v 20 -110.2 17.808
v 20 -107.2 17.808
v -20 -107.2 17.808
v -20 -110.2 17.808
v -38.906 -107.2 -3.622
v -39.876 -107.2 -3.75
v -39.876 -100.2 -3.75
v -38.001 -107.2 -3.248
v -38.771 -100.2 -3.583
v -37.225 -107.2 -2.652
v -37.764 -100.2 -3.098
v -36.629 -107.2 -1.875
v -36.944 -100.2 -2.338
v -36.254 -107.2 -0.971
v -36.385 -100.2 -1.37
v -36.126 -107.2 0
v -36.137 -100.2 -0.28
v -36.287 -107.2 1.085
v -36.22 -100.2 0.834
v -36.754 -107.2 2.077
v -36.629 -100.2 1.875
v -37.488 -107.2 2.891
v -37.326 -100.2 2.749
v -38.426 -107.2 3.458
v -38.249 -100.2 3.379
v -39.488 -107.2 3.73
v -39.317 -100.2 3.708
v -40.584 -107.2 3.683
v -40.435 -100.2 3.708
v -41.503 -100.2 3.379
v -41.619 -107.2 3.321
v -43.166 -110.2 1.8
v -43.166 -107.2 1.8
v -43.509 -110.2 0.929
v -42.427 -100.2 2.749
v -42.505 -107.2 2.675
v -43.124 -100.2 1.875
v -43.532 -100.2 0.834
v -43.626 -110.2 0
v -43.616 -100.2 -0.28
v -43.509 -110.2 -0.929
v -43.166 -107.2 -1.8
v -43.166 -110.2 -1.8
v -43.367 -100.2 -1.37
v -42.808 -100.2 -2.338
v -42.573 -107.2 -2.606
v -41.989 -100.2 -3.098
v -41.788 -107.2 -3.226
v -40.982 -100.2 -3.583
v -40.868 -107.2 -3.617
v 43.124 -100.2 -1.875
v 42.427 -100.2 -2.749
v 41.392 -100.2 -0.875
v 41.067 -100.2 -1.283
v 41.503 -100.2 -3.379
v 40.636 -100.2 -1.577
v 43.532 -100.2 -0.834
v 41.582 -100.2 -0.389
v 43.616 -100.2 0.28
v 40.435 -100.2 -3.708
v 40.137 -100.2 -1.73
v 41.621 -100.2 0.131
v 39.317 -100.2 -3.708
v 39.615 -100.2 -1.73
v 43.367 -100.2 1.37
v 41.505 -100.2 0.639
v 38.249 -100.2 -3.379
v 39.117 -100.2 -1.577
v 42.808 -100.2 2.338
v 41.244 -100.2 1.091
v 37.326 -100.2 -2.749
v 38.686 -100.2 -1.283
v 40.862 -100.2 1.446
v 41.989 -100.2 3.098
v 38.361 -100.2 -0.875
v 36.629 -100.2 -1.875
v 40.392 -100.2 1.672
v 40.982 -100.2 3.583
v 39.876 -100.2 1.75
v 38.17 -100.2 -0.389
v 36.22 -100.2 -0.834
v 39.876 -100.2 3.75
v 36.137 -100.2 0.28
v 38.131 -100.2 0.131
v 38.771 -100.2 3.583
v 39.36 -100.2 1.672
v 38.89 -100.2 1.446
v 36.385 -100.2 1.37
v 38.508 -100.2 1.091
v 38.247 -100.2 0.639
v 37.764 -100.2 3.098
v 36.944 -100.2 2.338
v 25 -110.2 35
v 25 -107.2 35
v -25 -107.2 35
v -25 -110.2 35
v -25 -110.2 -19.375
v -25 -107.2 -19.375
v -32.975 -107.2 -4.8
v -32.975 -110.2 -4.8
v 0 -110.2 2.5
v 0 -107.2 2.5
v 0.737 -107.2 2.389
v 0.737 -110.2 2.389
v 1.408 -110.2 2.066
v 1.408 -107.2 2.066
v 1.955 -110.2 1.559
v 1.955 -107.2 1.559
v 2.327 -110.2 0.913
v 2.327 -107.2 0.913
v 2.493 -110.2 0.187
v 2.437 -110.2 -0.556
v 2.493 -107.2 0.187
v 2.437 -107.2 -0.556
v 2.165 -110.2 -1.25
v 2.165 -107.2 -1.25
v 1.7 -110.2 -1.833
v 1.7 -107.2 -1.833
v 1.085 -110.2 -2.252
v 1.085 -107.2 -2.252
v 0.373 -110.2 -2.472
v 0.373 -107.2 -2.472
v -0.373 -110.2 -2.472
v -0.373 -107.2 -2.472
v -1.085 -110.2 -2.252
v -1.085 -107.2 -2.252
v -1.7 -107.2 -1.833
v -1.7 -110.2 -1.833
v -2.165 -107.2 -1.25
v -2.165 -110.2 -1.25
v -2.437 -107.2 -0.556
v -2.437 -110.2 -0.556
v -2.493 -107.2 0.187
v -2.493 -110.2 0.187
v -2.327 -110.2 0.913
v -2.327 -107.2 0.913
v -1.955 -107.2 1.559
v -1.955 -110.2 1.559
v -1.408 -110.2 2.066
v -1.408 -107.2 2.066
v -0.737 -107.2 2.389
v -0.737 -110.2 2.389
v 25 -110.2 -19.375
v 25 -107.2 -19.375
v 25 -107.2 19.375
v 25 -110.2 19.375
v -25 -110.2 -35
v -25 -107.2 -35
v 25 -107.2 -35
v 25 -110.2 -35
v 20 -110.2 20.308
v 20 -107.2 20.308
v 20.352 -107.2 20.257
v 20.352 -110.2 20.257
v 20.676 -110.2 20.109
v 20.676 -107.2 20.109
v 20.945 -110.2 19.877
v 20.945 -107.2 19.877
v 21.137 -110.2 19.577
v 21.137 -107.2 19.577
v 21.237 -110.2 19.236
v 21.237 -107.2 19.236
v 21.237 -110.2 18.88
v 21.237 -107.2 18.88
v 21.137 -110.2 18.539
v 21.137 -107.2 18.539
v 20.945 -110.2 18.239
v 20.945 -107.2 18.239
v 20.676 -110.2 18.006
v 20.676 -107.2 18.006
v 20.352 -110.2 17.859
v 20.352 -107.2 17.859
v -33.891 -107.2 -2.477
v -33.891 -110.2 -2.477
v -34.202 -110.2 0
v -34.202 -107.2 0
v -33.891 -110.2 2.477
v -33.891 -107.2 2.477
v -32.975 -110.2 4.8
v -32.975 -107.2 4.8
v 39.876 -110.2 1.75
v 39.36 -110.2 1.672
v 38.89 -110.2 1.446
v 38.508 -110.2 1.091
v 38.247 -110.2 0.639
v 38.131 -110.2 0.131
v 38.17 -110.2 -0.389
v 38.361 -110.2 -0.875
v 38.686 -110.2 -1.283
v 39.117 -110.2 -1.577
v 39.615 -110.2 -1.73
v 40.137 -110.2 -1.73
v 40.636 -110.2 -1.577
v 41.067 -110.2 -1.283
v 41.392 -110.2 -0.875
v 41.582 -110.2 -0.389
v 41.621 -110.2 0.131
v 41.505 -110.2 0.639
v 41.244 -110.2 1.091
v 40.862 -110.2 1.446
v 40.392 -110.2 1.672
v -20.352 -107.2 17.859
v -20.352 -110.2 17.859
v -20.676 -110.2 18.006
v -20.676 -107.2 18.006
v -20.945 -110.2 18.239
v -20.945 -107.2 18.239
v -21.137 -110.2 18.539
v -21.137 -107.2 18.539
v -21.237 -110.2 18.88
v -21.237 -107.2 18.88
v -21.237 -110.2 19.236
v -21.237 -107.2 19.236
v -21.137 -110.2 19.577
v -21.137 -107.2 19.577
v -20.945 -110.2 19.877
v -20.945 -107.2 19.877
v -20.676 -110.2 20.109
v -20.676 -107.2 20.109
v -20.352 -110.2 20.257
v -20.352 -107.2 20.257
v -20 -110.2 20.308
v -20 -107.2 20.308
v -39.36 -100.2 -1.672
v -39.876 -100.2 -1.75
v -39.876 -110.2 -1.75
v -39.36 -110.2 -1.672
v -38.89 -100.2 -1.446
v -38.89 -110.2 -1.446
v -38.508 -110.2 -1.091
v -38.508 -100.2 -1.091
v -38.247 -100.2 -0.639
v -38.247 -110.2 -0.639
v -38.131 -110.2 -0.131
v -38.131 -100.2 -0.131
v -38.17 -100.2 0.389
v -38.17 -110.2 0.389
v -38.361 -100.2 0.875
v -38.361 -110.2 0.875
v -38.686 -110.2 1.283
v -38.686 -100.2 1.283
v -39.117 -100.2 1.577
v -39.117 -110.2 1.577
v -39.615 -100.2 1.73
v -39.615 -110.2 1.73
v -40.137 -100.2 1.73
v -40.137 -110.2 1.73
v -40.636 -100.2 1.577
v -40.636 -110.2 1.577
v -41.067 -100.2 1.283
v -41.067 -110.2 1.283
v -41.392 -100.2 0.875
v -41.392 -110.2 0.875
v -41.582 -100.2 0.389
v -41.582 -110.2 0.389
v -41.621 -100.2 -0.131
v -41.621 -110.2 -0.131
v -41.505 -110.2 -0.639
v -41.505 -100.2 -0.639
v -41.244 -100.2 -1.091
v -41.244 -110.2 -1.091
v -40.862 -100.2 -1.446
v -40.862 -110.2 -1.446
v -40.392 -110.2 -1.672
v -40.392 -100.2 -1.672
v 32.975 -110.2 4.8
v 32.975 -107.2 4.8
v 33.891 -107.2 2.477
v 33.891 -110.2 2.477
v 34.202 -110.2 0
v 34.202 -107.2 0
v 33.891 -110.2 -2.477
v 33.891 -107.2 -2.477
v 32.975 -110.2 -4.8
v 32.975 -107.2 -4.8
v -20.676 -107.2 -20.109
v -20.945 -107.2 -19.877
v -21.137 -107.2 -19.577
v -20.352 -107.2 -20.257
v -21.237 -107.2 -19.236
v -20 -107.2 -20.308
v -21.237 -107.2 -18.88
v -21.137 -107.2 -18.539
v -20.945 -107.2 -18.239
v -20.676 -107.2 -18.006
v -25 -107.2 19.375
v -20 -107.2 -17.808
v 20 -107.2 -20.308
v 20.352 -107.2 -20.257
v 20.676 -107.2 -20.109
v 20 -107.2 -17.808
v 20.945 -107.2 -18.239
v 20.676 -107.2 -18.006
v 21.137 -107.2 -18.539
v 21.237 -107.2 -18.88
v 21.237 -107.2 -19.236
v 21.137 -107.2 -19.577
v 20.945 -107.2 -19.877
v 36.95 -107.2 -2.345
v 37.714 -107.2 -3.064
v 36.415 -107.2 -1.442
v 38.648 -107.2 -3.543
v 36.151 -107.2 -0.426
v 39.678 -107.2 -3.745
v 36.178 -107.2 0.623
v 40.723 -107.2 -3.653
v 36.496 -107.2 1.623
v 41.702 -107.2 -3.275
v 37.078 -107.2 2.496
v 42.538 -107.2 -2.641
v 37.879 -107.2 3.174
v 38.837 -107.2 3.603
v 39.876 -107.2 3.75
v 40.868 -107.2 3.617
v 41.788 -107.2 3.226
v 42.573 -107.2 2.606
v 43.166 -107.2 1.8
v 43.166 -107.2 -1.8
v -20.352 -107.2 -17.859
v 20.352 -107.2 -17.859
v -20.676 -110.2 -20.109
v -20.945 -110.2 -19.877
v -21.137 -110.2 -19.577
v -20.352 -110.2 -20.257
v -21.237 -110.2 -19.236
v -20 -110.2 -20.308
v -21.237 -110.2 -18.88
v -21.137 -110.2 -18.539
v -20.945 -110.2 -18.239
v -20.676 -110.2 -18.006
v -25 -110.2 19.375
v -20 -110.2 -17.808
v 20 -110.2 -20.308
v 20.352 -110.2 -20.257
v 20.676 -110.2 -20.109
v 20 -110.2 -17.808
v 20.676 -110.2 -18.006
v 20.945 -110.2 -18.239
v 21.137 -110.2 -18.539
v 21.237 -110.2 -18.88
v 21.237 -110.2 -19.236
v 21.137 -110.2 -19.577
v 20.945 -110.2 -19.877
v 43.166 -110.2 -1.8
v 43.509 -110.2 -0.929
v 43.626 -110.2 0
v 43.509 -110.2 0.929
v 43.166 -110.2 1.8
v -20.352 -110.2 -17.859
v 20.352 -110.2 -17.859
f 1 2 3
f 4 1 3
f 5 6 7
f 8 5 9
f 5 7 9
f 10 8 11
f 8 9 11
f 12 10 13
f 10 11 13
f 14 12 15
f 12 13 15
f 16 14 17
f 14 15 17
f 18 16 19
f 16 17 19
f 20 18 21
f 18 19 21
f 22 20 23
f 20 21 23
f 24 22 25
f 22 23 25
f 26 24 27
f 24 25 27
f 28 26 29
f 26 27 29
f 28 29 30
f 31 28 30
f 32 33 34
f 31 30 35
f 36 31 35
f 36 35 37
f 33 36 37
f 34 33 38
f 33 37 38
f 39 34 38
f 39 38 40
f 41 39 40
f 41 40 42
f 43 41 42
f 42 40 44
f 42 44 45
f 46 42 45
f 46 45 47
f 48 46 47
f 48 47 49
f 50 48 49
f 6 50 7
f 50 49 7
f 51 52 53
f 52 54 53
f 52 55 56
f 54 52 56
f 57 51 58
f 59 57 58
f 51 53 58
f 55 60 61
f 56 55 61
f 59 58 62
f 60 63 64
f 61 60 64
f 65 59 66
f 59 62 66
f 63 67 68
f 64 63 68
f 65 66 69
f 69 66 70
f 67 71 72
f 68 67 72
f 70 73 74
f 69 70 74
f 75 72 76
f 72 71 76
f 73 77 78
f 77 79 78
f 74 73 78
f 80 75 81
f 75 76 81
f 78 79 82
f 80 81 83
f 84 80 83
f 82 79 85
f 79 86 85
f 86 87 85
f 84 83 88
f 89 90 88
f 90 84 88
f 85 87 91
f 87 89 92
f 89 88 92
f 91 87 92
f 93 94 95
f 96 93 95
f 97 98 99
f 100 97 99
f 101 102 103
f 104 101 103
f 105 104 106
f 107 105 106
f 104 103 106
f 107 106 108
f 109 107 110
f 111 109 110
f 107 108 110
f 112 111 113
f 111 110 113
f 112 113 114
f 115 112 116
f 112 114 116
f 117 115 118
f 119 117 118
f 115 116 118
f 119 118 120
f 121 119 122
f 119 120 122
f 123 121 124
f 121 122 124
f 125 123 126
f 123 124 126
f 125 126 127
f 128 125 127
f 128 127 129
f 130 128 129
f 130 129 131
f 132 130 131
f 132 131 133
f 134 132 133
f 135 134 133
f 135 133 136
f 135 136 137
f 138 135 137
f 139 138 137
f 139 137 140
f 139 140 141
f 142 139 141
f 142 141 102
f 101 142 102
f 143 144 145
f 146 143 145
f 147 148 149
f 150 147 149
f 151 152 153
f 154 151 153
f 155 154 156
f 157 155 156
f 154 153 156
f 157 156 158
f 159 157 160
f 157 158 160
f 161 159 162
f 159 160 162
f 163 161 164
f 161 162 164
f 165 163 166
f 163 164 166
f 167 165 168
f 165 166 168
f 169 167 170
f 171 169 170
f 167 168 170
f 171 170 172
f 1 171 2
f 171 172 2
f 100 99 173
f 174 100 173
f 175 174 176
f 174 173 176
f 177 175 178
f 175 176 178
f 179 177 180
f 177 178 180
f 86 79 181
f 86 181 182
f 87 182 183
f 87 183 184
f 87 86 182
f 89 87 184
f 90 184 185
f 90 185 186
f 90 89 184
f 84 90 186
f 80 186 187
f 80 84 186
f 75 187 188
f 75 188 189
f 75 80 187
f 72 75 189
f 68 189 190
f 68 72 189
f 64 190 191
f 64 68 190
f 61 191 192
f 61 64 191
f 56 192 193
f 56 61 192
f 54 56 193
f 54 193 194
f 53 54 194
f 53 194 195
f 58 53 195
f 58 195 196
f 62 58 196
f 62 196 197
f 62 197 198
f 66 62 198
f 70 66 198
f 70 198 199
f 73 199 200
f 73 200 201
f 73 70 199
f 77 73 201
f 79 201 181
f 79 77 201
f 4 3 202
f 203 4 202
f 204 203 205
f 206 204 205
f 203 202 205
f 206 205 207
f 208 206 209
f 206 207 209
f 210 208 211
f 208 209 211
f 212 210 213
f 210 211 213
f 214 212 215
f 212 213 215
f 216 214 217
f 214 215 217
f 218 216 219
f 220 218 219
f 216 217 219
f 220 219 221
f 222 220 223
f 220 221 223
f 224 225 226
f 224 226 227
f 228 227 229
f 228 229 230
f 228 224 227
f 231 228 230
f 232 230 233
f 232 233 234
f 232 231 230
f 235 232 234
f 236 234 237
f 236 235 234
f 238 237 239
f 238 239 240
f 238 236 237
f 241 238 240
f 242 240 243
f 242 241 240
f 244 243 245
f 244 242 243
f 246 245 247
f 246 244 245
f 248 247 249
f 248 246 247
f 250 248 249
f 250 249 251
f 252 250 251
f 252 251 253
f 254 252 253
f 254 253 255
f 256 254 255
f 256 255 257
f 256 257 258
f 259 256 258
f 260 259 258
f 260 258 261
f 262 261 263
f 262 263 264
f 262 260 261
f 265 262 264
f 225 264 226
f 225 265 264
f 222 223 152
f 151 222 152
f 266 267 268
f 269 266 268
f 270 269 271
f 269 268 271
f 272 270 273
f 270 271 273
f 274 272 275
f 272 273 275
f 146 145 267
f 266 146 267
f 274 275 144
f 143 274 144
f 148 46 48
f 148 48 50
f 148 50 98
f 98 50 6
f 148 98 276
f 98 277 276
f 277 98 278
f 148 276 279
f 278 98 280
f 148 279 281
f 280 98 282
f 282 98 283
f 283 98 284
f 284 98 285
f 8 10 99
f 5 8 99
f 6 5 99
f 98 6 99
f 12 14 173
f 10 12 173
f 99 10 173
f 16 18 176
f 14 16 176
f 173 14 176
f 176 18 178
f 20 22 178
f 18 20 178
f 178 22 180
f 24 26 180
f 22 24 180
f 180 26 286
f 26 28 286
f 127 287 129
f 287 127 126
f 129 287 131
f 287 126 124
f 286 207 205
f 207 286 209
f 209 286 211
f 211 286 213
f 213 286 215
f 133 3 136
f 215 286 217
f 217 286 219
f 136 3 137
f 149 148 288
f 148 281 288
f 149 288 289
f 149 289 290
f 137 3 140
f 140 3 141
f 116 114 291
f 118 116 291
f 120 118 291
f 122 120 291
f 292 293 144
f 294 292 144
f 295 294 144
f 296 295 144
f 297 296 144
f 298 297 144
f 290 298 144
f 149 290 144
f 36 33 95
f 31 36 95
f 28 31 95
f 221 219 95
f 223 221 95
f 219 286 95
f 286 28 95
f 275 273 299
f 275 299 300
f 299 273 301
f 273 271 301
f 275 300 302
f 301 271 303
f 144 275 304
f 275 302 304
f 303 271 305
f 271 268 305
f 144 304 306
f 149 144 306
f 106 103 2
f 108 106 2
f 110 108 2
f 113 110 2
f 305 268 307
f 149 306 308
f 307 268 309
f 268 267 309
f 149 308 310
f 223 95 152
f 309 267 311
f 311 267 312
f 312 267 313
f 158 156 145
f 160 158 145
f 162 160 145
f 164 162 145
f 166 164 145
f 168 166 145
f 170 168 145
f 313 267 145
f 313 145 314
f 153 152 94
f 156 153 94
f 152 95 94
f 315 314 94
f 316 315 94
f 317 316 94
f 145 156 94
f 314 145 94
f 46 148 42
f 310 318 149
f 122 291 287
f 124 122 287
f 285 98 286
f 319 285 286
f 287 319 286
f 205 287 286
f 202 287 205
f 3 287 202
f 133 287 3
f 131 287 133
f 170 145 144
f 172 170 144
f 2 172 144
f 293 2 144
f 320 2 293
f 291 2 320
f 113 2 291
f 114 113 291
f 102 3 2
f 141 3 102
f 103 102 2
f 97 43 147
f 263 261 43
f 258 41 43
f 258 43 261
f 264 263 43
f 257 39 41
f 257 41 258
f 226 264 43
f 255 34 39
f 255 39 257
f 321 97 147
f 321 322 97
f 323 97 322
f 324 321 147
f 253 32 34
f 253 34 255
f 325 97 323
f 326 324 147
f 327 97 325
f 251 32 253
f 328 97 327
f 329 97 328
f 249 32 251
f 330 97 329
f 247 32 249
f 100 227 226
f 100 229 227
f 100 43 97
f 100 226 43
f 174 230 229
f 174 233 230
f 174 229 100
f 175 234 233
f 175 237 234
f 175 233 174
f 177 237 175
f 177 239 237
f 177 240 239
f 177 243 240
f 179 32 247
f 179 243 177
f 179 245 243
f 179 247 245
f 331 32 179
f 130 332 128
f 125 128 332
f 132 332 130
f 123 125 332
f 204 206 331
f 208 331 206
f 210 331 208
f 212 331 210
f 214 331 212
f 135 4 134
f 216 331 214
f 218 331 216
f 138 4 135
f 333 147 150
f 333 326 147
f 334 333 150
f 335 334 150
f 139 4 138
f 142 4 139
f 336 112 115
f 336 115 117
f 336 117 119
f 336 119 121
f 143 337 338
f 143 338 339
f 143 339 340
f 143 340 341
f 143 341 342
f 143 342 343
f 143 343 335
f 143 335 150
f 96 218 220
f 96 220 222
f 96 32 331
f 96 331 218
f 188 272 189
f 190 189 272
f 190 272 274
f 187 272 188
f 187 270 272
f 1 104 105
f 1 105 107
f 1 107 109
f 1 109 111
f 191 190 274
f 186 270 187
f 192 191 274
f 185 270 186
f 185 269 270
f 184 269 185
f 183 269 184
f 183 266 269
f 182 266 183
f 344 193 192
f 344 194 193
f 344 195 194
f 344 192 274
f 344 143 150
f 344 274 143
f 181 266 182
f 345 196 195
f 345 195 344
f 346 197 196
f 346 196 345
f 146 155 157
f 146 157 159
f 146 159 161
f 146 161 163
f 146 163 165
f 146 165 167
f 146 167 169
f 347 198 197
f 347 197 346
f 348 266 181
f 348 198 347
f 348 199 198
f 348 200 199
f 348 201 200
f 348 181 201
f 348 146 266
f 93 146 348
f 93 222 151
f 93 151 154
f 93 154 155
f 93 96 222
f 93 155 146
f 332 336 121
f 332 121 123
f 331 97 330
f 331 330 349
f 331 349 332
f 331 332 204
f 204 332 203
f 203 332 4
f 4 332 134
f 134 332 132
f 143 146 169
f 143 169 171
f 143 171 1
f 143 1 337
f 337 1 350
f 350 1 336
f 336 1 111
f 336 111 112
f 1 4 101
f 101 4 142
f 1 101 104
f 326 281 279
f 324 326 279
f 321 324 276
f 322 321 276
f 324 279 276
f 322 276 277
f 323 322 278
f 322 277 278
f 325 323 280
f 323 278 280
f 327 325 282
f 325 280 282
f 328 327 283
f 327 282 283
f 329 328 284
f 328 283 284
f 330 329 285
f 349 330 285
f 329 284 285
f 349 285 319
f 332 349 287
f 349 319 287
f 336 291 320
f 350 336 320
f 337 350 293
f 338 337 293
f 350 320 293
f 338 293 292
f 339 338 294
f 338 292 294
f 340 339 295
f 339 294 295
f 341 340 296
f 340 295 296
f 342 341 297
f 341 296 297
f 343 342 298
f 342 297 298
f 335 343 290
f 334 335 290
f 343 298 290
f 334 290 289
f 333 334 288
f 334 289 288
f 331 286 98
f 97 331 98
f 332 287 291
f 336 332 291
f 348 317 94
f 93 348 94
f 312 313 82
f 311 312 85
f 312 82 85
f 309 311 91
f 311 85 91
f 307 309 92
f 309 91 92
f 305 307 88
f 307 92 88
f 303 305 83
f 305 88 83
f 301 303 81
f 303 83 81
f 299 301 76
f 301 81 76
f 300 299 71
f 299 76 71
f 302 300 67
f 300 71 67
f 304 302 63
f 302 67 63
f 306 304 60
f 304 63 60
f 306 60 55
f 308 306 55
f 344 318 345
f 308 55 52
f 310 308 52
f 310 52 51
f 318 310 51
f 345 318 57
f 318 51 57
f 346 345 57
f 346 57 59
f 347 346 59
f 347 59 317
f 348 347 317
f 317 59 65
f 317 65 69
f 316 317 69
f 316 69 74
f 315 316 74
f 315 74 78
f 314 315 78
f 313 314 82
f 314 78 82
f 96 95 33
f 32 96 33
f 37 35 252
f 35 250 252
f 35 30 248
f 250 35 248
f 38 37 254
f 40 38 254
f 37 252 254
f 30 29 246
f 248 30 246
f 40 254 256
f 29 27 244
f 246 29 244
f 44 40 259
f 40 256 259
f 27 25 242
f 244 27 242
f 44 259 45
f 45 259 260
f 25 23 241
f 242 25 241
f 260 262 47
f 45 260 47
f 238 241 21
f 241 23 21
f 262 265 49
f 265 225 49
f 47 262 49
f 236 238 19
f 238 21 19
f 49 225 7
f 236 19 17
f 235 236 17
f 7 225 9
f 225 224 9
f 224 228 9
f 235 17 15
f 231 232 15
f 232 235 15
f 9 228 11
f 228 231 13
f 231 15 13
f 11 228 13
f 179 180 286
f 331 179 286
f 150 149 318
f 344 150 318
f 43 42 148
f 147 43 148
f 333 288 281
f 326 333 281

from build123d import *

# Parameters (mm, degrees)
SKETCH1_R             = 3.75
SKETCH1_R_2           = 1.75
BOSS_EXTRUDE1_DEPTH   = 10
BOSS_EXTRUDE1_2_DEPTH = 10
BOSS_EXTRUDE2_START   = -3
BOSS_EXTRUDE2_DEPTH   = 3
SKETCH3_R             = 2.5
CUT_EXTRUDE1_DEPTH    = 57.367102098
CUT_EXTRUDE2_DEPTH    = 57.367102098


with BuildPart() as part:
    # Sketch1 → Boss-Extrude1 (new body)
    with BuildSketch(Plane.XZ.offset(100.2)):
        with Locations(Location((-39.876255843, 0, 0), (0, 0, 270))):
            Circle(SKETCH1_R)
        with Locations(Location((-39.876255843, 0, 0), (0, 0, 270))):
            Circle(SKETCH1_R_2, mode=Mode.SUBTRACT)
    extrude(amount=BOSS_EXTRUDE1_DEPTH)



with BuildPart() as body_2:
    # Sketch1 → Boss-Extrude1 2 (new body)
    with BuildSketch(Plane.XZ.offset(100.2)):
        with Locations(Location((39.876255843, 0, 0), (0, 0, 90))):
            Circle(SKETCH1_R)
        with Locations(Location((39.876255843, 0, 0), (0, 0, 90))):
            Circle(SKETCH1_R_2, mode=Mode.SUBTRACT)
    extrude(amount=BOSS_EXTRUDE1_2_DEPTH)


with BuildPart() as part_1:
    add(part.part)

    add(body_2.part)  # Boss-Extrude2 merges body 2
    # Sketch2 → Boss-Extrude2 (add)
    with BuildSketch(Plane.XZ.offset(110.2).offset(BOSS_EXTRUDE2_START)):
        with BuildLine():
            Line((25, 35), (-25, 35))
            Line((-25, 35), (-43.165990296, 1.800040897))
            ThreePointArc((-43.165990296, 1.800040897), (-38.94727904, 3.633111903), (-36.126255843, 0))
            ThreePointArc((-36.126255843, 0), (-38.94727904, -3.633111903), (-43.165990296, -1.800040897))
            Line((-43.165990296, -1.800040897), (-25, -35))
            Line((-25, -35), (25, -35))
            Line((25, -35), (43.165990296, -1.800040897))
            ThreePointArc((43.165990296, -1.800040897), (36.126255843, 0), (43.165990296, 1.800040897))
            Line((43.165990296, 1.800040897), (25, 35))
        make_face()
        with BuildLine():
            Line((-25, 19.375354996), (-25, -19.375354996))
            Line((-25, -19.375354996), (-32.975123568, -4.800109057))
            ThreePointArc((-32.975123568, -4.800109057), (-34.20249836, 0), (-32.975123568, 4.800109057))
            Line((-32.975123568, 4.800109057), (-25, 19.375354996))
        make_face(mode=Mode.SUBTRACT)
        with BuildLine():
            Line((32.975123568, -4.800109057), (25, -19.375354996))
            Line((25, -19.375354996), (25, 19.375354996))
            Line((25, 19.375354996), (32.975123568, 4.800109057))
            ThreePointArc((32.975123568, 4.800109057), (34.20249836, 0), (32.975123568, -4.800109057))
        make_face(mode=Mode.SUBTRACT)
    extrude(amount=BOSS_EXTRUDE2_DEPTH)

    # Sketch3 → Cut-Extrude1 (cut, through all)
    with BuildSketch(Plane(origin=(0, -107.2, 0), x_dir=(1, 0, 0), z_dir=(0, 1, 0))):
        with Locations(Location((0, 0, 0), (0, 0, 270))):
            Circle(SKETCH3_R)
    extrude(amount=-CUT_EXTRUDE1_DEPTH, mode=Mode.SUBTRACT)

    # Sketch4 → Cut-Extrude2 (cut, through all)
    with BuildSketch(Plane(origin=(0, -107.2, 0), x_dir=(1, 0, 0), z_dir=(0, 1, 0))):
        with BuildLine():
            Line((20, -17.807929785), (-20, -17.807929785))
            ThreePointArc((-20, -17.807929785), (-21.25, -19.057929785), (-20, -20.307929785))
            Line((-20, -20.307929785), (20, -20.307929785))
            ThreePointArc((20, -20.307929785), (21.25, -19.057929785), (20, -17.807929785))
        make_face()
        with BuildLine():
            Line((20, 20.307929785), (-20, 20.307929785))
            ThreePointArc((-20, 20.307929785), (-21.25, 19.057929785), (-20, 17.807929785))
            Line((-20, 17.807929785), (20, 17.807929785))
            ThreePointArc((20, 17.807929785), (21.25, 19.057929785), (20, 20.307929785))
        make_face()
    extrude(amount=-CUT_EXTRUDE2_DEPTH, mode=Mode.SUBTRACT)


solid = part_1.part
